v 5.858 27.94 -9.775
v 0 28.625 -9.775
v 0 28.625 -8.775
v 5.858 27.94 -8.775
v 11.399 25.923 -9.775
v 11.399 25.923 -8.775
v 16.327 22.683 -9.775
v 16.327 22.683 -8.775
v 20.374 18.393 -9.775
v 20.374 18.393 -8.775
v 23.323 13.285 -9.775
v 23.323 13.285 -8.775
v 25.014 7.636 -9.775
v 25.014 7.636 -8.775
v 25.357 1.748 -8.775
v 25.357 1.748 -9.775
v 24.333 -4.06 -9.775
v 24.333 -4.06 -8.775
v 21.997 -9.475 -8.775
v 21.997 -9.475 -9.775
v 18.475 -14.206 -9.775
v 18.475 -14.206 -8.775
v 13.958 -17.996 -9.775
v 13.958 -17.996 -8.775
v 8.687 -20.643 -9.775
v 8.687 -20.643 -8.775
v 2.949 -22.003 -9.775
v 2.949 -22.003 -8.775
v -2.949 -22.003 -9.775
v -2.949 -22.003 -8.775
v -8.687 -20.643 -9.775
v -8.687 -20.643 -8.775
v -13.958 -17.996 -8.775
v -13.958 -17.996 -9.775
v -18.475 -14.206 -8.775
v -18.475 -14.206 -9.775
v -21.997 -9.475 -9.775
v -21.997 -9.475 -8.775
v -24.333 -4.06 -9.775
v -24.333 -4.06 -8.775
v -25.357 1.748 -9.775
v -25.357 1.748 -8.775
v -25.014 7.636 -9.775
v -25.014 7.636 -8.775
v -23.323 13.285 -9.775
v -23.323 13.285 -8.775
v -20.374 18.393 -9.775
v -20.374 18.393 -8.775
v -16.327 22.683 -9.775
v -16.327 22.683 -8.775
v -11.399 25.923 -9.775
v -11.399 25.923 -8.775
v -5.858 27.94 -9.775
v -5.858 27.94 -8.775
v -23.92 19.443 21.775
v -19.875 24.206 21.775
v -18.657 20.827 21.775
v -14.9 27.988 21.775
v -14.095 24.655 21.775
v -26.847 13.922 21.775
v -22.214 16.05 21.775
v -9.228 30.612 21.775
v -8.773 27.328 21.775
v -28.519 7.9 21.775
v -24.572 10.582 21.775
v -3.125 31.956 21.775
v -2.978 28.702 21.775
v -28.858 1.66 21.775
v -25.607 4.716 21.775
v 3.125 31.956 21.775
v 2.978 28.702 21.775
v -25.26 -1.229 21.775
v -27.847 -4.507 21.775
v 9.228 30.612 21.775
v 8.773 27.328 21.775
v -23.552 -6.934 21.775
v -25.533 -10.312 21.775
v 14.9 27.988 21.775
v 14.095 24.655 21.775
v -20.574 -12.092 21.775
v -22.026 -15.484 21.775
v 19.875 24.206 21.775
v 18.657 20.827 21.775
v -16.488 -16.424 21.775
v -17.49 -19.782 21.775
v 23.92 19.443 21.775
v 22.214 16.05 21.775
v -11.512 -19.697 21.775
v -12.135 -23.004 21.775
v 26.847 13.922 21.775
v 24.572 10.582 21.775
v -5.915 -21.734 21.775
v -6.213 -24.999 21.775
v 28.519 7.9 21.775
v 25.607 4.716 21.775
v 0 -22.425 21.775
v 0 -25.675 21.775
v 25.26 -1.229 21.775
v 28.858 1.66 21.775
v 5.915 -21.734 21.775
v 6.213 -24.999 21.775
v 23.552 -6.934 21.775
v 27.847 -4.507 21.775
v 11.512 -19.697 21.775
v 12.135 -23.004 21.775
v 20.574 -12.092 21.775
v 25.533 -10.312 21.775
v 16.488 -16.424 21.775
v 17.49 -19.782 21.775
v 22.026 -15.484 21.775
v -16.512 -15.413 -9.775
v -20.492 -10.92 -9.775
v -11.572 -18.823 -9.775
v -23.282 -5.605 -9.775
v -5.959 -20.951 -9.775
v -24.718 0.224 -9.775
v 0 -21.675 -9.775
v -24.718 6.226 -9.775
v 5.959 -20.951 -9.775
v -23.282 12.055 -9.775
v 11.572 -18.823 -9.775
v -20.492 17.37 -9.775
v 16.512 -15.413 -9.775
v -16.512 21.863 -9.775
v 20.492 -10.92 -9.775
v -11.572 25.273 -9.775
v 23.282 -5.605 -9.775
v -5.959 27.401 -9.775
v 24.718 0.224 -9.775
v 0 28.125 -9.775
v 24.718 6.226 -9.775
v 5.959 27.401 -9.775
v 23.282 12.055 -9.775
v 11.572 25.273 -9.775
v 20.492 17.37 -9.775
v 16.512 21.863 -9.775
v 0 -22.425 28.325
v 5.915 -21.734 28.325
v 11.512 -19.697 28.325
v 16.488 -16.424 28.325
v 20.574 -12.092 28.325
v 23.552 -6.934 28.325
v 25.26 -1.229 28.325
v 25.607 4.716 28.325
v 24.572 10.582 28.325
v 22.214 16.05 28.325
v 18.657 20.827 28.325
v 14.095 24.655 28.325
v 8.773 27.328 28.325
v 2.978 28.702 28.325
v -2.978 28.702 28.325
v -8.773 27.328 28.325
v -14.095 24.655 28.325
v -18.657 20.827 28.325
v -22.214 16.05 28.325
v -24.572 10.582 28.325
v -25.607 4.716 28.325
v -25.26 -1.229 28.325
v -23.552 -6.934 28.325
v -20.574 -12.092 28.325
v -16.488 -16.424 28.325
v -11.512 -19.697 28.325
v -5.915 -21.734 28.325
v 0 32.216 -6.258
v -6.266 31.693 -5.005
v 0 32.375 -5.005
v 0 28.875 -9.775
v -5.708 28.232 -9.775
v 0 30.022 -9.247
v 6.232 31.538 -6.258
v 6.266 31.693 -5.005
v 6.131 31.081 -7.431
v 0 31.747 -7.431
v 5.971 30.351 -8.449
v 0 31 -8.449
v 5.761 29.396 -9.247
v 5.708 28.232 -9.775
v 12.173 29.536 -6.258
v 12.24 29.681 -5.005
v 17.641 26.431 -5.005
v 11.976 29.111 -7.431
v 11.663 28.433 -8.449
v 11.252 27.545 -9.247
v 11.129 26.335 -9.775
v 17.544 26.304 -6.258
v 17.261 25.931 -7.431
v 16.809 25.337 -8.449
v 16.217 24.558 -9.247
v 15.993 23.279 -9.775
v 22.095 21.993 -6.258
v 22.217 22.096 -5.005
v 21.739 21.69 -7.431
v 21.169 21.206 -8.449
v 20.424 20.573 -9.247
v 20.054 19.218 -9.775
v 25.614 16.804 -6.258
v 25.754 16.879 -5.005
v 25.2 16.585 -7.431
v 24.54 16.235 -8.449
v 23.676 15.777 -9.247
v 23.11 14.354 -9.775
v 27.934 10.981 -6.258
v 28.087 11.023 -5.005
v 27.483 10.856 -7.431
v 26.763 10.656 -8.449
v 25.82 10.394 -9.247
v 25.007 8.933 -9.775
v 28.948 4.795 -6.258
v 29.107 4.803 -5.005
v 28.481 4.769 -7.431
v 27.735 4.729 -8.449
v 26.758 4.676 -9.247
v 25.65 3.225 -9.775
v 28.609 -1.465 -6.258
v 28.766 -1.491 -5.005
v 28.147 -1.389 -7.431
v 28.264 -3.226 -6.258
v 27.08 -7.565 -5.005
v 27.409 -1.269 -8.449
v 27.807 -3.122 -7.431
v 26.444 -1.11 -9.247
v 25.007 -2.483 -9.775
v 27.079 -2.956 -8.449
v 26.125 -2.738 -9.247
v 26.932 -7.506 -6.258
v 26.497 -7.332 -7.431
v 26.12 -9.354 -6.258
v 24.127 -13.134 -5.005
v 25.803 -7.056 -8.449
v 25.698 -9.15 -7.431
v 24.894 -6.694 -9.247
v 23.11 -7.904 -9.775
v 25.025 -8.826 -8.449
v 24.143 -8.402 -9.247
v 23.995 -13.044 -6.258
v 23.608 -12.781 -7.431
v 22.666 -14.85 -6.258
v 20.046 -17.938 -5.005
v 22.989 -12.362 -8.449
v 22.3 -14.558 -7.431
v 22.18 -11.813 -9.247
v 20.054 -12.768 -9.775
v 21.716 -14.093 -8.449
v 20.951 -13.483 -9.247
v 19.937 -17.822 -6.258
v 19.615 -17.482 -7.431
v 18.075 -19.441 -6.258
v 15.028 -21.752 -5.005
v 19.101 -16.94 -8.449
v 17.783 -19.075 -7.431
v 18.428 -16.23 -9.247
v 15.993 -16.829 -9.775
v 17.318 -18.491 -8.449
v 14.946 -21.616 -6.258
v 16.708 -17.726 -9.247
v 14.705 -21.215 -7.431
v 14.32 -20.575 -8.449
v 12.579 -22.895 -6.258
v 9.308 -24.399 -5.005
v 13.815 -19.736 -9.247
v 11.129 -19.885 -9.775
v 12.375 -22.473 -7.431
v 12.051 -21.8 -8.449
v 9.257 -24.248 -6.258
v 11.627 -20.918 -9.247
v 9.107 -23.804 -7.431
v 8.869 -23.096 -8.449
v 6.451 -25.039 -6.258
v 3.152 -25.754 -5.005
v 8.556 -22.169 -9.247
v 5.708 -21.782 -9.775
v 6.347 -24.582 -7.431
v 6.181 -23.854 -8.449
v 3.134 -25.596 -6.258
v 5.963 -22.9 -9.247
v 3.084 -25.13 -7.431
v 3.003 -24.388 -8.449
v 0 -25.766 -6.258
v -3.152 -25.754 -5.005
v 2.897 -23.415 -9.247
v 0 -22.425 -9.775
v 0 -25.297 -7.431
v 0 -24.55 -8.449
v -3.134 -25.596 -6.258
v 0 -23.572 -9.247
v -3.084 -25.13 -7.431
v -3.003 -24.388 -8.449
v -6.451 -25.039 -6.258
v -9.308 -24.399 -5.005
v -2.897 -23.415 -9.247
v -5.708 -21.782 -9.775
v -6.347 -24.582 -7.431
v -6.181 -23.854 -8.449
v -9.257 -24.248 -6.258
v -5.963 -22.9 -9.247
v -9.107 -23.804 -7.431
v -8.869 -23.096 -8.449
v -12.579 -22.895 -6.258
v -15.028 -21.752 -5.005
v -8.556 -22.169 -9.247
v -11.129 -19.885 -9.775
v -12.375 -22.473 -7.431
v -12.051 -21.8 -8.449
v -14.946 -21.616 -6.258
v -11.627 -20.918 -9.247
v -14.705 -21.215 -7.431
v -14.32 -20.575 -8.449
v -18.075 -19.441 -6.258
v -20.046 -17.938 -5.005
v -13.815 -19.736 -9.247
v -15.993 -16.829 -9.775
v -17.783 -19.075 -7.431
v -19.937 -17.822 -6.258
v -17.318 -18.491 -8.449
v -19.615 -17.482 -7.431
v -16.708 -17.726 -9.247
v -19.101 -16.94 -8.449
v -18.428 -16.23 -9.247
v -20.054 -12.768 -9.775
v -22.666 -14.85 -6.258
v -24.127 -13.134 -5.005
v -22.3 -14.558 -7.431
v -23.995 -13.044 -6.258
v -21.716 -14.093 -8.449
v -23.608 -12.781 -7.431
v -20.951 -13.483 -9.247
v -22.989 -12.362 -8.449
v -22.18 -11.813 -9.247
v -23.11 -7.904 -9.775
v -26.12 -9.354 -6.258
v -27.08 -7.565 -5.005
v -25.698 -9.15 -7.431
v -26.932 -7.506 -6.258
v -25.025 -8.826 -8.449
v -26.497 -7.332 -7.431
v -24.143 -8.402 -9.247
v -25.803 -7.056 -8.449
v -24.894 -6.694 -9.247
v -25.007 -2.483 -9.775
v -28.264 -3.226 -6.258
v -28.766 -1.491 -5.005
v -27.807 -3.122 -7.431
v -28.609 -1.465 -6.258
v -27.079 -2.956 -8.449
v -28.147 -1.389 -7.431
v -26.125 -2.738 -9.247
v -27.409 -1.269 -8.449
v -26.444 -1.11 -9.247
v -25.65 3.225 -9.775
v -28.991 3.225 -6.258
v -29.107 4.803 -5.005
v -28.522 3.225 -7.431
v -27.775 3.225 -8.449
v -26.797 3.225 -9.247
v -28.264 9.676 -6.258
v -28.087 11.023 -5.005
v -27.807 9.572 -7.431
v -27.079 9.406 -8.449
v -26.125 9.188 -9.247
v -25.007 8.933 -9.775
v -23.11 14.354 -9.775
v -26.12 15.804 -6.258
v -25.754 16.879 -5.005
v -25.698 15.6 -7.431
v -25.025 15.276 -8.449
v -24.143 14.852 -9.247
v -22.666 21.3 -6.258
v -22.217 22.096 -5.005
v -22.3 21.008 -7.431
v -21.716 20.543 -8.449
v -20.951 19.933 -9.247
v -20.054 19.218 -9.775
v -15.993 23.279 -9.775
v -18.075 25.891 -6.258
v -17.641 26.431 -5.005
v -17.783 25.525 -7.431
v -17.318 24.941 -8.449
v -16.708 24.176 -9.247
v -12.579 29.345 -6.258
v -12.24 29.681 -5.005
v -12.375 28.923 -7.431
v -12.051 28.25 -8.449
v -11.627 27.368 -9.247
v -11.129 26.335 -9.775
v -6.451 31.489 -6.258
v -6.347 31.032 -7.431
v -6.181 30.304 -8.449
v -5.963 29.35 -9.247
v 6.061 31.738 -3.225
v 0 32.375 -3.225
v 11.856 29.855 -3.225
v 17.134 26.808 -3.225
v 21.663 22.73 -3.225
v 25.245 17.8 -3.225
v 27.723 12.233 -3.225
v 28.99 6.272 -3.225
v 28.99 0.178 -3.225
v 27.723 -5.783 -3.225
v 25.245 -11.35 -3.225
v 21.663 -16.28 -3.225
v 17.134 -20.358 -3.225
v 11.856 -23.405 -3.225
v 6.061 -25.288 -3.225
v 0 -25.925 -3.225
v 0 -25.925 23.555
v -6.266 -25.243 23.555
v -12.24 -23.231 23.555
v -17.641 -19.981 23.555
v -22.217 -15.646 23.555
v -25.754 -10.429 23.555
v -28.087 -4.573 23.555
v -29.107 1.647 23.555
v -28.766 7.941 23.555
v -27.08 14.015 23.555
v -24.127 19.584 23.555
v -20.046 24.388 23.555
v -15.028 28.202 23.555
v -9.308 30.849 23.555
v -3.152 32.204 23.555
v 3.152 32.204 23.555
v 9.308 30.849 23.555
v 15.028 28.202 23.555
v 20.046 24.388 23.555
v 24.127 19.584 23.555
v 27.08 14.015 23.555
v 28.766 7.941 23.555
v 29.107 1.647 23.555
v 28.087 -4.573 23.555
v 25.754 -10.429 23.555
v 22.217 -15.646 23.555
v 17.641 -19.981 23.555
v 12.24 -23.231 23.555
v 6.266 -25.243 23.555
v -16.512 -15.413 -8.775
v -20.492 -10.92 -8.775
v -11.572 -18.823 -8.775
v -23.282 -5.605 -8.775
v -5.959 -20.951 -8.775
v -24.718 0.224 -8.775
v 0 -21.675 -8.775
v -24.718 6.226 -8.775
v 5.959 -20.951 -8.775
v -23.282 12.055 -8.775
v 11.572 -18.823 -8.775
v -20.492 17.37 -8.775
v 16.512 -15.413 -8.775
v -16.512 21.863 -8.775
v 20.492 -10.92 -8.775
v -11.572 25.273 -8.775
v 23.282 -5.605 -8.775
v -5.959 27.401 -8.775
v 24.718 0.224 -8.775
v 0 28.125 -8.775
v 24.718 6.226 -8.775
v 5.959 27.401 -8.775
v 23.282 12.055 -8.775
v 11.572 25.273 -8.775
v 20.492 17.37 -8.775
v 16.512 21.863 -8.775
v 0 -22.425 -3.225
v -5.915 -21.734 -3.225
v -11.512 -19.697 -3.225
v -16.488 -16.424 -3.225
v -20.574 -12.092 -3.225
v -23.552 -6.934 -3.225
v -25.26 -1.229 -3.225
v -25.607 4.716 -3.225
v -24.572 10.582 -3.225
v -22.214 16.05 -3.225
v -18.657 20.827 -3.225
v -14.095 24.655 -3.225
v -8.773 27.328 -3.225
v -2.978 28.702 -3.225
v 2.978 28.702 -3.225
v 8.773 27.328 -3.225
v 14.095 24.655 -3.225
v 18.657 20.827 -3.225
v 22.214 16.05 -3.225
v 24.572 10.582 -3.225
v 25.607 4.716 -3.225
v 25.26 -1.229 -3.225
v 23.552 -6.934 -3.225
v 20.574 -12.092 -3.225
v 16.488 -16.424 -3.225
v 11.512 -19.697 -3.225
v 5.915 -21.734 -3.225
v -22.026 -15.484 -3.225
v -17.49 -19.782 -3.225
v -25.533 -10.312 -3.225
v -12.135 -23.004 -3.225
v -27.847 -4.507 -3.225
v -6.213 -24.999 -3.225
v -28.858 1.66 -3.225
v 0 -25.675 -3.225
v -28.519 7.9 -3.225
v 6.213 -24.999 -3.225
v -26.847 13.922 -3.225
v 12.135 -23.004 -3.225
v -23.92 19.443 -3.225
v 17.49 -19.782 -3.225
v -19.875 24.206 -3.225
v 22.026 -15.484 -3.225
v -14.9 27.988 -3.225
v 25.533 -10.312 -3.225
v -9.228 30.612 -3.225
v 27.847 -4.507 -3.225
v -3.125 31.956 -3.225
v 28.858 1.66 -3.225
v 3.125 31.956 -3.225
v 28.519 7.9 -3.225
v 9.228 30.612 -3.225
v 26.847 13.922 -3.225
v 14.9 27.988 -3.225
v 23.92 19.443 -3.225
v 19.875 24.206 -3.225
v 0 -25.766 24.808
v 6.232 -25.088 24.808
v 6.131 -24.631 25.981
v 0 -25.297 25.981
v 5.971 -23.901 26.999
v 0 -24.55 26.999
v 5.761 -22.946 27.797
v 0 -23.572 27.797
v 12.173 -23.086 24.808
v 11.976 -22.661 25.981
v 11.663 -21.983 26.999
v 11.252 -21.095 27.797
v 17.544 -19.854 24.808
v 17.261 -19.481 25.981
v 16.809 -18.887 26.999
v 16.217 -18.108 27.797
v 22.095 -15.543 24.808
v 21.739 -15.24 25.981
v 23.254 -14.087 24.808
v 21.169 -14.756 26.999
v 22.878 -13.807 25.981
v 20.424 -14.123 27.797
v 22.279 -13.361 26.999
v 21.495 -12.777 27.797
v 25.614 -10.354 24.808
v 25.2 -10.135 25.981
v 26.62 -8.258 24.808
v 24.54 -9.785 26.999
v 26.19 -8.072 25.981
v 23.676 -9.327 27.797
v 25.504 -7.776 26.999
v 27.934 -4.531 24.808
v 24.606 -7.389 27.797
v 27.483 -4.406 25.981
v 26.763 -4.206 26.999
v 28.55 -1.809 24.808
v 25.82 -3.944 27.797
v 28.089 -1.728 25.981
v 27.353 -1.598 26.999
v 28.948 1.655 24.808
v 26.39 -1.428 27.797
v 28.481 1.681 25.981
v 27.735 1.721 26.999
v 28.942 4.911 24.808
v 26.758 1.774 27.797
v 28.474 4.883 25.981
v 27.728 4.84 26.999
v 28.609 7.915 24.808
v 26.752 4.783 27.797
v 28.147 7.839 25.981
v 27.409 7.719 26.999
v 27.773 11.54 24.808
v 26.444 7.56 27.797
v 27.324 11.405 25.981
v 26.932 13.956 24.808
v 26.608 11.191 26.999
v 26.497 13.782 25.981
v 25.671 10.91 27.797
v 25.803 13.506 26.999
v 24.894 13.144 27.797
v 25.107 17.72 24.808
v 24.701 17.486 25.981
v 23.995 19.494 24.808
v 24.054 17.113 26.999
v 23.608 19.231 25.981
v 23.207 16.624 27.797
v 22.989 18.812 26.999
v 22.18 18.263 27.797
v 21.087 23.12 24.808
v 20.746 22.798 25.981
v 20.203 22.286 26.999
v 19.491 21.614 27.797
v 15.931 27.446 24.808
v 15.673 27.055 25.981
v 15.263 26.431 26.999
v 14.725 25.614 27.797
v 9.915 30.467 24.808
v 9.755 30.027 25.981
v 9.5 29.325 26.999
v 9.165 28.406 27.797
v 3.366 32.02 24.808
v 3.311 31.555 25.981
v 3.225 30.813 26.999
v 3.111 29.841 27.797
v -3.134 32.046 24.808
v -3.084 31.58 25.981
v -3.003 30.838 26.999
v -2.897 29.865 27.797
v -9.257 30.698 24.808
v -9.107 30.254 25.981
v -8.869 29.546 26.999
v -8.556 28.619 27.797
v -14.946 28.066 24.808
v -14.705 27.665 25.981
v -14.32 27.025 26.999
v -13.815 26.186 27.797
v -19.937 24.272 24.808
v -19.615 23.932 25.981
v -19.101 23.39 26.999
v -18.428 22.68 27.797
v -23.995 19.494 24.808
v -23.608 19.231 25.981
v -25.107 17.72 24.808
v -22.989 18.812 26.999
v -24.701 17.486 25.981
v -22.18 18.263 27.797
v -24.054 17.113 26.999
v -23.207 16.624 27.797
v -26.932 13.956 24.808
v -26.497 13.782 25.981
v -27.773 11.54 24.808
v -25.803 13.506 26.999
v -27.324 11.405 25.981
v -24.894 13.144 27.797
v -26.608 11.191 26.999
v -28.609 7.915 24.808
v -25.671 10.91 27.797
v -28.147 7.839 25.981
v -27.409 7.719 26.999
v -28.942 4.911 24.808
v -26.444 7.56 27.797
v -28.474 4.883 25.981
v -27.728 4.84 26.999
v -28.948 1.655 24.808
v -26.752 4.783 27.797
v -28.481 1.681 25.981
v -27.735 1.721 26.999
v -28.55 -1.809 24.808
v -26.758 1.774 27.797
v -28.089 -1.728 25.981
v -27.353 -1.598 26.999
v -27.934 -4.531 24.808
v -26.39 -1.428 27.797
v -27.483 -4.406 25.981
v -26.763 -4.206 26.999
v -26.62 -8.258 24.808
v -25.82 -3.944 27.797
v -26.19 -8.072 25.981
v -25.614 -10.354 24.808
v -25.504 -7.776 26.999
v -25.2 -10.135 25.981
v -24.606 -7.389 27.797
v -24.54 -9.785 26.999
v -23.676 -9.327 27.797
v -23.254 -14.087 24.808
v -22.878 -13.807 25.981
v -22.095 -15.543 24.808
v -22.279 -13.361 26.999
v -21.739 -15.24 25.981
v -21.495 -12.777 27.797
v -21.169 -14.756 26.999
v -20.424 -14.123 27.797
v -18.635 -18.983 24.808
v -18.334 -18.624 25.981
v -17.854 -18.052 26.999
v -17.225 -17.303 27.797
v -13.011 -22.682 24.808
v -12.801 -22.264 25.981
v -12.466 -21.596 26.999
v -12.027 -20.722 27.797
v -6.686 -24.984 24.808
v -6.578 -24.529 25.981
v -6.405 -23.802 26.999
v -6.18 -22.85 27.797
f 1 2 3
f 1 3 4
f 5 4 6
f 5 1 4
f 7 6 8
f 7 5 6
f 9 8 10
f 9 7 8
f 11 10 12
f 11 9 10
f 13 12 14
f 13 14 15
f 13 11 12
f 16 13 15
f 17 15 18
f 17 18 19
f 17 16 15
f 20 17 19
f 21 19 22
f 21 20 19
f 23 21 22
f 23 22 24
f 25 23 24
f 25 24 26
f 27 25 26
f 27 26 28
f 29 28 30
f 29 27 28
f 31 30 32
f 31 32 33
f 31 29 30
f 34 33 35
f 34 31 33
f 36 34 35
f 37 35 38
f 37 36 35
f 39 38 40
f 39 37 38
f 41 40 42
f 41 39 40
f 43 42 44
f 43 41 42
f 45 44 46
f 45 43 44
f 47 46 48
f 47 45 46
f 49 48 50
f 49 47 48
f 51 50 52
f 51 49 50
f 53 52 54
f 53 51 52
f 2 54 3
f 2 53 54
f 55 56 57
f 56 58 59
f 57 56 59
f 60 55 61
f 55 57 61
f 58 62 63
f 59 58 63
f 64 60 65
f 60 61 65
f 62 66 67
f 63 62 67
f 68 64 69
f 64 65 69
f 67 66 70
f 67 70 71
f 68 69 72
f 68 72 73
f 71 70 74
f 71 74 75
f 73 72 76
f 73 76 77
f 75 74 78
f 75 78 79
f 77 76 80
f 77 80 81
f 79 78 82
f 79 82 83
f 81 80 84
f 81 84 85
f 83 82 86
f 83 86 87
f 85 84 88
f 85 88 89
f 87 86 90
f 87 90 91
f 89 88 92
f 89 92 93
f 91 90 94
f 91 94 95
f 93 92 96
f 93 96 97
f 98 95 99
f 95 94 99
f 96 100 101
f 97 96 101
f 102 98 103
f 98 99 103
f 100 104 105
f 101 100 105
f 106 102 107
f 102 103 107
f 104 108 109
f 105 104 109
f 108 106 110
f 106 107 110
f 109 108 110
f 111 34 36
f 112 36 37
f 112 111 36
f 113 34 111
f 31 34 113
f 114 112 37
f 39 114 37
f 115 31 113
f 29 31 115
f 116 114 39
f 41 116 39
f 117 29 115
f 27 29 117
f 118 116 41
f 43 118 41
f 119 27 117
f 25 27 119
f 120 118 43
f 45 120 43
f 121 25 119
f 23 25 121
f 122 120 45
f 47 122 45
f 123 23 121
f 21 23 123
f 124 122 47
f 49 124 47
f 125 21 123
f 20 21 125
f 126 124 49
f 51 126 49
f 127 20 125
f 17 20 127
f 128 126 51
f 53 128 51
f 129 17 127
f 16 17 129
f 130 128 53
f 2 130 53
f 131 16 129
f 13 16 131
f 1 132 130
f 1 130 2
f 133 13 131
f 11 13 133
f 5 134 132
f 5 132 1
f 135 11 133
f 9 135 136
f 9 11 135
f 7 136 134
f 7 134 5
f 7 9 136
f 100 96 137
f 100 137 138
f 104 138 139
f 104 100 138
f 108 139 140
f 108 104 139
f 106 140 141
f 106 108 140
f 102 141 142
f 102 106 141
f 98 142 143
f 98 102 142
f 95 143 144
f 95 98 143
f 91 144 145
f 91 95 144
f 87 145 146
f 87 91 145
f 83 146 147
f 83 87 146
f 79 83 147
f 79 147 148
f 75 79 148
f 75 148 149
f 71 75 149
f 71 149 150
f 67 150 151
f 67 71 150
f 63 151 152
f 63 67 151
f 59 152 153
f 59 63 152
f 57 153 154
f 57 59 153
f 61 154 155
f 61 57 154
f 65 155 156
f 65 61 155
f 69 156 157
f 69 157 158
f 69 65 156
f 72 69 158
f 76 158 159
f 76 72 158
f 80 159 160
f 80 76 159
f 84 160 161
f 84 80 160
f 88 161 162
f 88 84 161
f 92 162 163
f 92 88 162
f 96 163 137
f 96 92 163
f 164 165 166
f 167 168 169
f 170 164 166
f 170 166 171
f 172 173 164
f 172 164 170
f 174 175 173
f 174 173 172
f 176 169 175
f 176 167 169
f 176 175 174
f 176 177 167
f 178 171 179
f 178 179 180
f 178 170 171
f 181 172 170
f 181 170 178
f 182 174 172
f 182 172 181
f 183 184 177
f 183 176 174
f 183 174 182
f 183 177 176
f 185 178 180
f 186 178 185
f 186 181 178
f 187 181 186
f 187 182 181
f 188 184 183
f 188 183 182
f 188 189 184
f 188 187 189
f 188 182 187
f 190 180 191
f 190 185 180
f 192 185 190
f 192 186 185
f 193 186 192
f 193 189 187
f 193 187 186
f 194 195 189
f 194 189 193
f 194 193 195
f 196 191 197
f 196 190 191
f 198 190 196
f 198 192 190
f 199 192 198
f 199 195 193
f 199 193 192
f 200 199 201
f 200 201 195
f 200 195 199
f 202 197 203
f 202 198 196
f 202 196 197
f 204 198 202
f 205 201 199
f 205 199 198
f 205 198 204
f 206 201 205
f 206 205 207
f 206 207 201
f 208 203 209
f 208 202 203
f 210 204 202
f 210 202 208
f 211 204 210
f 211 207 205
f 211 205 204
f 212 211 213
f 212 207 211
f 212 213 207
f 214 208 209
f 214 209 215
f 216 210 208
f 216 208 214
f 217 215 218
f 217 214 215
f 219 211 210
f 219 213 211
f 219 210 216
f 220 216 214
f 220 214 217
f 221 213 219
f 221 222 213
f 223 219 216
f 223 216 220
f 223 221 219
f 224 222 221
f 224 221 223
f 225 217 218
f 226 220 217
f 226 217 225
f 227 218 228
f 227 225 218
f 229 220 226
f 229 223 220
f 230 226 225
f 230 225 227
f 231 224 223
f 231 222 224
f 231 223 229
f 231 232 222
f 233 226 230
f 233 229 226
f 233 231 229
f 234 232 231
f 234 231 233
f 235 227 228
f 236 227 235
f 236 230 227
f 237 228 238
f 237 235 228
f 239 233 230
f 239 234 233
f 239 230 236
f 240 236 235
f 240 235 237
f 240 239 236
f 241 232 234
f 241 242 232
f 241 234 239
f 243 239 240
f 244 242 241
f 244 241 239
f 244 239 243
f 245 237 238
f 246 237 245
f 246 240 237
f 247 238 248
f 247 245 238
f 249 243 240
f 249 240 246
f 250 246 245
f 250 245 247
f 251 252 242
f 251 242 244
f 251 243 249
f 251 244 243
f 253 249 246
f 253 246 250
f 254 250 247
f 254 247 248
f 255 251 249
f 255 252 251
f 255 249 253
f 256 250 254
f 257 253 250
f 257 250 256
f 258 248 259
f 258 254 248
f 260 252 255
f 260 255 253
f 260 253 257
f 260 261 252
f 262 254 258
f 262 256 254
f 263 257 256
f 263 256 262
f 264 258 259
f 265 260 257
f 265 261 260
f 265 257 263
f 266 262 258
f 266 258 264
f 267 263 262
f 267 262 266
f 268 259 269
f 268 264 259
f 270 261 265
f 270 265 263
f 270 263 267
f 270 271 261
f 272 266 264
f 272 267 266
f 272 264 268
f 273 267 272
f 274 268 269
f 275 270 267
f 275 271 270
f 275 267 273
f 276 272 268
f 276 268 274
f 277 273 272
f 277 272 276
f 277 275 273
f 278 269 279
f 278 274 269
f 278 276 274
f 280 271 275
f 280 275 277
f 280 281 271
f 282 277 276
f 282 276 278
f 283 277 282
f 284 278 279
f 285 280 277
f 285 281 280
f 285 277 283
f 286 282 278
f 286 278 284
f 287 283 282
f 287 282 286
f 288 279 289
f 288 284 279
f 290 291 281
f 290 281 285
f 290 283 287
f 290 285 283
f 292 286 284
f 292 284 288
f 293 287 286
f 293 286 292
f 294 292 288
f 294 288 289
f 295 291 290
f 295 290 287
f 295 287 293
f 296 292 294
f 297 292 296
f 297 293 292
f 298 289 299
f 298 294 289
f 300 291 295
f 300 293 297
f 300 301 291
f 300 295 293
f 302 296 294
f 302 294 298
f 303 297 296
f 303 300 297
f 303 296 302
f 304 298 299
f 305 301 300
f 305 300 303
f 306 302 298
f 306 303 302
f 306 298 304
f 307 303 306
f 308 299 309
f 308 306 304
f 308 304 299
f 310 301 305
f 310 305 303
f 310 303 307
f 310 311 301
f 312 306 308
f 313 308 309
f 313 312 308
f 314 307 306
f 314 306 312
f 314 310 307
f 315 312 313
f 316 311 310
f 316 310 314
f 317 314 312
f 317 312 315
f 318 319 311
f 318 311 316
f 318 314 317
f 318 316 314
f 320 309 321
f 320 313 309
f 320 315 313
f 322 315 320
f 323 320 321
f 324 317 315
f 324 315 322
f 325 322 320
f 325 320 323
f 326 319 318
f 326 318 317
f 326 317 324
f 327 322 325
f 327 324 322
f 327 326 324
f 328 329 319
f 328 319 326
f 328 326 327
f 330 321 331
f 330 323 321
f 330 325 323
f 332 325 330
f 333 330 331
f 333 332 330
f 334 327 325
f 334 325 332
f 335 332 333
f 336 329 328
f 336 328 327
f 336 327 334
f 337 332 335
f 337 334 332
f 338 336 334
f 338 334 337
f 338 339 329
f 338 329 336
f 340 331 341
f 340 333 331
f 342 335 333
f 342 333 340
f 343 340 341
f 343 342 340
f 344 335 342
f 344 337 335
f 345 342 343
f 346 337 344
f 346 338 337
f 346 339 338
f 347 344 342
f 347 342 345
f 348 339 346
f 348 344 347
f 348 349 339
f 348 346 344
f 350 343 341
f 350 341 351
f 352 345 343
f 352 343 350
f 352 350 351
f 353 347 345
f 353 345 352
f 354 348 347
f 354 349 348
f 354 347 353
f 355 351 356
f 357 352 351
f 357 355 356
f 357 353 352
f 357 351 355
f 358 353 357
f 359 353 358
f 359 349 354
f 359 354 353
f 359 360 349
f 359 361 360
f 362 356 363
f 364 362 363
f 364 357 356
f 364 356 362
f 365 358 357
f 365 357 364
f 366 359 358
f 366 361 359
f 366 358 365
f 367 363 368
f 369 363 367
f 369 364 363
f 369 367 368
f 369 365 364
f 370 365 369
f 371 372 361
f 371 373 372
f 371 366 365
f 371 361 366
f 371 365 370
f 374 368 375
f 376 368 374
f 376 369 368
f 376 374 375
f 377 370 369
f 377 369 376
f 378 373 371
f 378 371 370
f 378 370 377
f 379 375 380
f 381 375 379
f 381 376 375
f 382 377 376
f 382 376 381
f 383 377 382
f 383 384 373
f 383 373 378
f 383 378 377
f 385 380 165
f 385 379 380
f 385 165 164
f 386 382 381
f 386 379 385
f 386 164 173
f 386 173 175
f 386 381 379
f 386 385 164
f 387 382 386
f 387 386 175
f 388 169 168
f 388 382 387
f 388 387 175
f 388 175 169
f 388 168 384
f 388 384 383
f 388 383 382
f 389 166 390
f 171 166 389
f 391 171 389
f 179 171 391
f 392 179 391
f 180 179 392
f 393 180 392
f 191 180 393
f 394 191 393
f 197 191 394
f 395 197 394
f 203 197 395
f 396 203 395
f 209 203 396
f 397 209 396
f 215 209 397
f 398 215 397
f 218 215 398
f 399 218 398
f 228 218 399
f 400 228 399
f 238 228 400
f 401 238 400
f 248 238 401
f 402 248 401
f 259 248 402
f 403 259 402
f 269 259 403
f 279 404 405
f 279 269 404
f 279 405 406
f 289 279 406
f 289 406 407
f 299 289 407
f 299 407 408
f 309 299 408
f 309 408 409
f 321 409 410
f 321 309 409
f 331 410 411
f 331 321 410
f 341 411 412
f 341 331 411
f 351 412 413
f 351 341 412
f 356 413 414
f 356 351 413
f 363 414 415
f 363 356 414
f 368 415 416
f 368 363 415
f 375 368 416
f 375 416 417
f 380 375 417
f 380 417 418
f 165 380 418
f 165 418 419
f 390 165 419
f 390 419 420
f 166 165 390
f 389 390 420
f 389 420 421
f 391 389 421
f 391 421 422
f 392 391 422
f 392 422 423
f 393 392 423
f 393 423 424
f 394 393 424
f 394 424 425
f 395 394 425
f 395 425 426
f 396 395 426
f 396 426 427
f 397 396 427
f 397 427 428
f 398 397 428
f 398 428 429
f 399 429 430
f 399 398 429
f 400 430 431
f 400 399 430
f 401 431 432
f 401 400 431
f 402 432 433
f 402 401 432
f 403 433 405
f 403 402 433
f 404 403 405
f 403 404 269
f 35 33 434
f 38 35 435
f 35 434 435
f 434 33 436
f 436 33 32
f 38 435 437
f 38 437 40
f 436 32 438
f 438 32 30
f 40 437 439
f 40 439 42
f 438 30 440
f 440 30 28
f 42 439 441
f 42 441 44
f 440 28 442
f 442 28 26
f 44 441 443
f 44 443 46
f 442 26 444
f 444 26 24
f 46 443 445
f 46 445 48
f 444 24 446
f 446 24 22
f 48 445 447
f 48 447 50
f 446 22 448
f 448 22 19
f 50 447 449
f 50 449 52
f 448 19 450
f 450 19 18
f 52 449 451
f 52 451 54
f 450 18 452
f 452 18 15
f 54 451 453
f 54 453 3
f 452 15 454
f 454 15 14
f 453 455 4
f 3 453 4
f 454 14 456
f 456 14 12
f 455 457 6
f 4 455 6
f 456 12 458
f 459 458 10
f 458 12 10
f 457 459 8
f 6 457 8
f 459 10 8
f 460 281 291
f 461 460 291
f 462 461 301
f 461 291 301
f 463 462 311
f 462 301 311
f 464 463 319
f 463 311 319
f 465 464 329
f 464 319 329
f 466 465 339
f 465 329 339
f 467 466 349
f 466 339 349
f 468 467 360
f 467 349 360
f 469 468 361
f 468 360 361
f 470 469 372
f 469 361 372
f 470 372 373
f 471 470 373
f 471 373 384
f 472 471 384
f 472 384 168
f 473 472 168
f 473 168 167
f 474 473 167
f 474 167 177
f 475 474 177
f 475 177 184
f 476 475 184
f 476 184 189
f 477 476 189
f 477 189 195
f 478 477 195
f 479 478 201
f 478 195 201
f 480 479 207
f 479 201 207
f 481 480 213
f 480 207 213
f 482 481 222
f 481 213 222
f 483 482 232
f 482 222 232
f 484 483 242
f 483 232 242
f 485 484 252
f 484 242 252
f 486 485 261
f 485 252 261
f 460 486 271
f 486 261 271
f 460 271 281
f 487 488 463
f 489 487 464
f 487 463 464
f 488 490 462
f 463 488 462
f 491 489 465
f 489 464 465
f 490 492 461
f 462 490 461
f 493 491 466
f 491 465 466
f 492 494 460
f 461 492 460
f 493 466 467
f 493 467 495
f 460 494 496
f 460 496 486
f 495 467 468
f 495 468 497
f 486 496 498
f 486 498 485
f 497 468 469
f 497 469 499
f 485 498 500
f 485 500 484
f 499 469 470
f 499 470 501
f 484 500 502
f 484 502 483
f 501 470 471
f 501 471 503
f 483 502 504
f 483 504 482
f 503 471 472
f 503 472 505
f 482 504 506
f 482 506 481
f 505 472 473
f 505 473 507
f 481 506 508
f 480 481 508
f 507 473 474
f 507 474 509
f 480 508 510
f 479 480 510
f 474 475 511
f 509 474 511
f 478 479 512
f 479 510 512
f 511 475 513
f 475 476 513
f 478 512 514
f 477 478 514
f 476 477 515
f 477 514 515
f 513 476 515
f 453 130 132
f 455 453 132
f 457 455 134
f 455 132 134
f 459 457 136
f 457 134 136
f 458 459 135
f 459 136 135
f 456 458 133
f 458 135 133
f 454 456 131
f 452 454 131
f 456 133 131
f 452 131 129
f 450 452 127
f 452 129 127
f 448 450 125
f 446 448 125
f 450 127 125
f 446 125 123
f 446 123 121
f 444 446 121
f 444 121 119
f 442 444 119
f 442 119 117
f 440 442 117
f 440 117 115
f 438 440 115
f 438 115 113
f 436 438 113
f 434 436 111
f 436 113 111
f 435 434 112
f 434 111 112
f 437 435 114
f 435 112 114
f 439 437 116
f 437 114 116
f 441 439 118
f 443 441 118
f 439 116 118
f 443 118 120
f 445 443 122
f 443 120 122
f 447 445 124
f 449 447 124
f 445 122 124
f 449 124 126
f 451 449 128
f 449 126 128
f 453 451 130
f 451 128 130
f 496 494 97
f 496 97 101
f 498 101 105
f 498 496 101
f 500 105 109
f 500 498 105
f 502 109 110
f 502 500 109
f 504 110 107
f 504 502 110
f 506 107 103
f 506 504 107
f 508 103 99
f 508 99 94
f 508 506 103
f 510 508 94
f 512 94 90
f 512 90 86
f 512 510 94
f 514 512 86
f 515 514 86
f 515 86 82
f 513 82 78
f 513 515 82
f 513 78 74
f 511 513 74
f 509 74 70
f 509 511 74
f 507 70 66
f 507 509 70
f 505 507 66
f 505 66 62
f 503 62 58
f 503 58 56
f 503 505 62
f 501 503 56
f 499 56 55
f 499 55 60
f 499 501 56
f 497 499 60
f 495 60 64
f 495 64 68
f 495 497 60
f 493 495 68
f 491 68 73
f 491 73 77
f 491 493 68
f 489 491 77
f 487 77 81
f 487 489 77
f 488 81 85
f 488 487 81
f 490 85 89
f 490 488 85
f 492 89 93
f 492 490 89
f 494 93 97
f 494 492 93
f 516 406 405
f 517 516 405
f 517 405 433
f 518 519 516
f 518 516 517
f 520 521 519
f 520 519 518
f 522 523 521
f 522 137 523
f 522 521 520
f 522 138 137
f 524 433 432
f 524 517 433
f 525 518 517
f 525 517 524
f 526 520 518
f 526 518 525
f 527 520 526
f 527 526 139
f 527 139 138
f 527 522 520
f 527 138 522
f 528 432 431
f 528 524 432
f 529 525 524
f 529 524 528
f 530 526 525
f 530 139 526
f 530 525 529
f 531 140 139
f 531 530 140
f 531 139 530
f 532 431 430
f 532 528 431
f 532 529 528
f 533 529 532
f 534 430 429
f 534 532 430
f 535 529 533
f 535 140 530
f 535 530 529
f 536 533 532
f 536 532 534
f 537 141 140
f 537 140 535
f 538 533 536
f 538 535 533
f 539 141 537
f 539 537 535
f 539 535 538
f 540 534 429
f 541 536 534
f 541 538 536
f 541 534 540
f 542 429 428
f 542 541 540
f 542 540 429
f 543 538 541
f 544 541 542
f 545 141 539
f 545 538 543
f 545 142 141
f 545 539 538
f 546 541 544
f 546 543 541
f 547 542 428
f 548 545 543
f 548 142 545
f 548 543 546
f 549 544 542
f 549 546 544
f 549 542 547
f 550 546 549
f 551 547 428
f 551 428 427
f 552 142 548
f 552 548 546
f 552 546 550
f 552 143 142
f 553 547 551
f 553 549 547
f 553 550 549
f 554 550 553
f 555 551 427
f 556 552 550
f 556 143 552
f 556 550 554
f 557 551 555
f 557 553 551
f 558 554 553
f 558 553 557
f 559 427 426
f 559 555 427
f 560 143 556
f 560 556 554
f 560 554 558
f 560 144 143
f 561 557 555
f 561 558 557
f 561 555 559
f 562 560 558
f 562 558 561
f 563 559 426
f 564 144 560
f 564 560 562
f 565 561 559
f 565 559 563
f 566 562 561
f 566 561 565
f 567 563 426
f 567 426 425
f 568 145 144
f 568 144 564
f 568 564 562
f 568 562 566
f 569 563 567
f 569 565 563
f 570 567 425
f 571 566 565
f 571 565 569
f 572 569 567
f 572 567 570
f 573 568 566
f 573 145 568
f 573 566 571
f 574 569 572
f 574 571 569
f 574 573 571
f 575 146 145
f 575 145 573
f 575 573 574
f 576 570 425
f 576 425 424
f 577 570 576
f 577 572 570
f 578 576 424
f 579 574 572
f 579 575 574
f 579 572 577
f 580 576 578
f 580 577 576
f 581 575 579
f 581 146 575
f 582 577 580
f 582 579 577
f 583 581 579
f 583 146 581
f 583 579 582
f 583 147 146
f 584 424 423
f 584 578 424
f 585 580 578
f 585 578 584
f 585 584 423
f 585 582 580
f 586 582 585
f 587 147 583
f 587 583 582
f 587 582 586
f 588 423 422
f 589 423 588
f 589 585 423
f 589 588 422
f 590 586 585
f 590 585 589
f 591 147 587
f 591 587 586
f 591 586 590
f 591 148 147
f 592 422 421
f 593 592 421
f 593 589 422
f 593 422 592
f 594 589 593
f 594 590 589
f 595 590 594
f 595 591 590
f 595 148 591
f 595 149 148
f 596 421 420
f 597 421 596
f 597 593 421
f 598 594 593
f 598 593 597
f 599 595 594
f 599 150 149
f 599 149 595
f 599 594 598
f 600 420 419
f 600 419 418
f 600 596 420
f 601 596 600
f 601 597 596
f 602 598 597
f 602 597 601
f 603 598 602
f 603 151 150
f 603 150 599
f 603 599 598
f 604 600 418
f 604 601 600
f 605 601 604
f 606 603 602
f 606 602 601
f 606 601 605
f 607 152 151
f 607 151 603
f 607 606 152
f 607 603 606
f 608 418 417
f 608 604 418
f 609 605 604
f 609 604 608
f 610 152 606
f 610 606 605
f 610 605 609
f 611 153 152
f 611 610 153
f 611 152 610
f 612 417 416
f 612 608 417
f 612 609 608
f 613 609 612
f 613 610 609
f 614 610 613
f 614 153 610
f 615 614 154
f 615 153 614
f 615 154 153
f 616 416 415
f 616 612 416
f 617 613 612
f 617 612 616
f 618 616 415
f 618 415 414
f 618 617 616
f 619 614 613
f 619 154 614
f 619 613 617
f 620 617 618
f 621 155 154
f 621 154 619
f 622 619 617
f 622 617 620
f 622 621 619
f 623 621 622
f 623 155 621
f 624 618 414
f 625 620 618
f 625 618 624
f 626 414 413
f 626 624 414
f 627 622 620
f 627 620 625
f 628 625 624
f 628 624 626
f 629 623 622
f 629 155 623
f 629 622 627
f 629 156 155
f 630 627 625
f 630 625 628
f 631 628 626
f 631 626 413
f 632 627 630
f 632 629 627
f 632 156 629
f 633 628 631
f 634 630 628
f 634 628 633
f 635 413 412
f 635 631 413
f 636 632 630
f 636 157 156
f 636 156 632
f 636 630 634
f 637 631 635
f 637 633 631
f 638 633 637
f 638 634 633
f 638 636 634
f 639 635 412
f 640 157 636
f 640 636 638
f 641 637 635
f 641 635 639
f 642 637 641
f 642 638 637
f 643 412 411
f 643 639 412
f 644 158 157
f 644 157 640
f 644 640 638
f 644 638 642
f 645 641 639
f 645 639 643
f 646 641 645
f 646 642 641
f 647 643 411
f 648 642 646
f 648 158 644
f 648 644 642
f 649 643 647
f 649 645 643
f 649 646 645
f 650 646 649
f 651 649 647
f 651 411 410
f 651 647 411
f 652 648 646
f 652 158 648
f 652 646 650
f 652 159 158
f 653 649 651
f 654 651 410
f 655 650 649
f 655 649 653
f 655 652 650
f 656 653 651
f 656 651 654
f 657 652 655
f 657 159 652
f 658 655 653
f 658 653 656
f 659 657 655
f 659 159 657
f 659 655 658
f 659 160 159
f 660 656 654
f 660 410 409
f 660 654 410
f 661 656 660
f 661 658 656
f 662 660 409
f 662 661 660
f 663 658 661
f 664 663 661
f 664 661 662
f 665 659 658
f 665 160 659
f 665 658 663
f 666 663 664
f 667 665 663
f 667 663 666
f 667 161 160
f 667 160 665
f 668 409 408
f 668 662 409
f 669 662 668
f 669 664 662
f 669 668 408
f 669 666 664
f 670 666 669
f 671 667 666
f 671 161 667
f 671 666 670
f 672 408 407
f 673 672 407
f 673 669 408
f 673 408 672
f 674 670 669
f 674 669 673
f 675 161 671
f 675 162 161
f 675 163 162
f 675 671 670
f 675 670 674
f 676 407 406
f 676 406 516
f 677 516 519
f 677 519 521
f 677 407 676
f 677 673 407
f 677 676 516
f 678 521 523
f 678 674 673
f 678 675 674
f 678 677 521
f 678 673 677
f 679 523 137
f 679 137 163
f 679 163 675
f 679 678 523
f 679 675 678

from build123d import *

# Parameters (mm, degrees)
SKETCH1_R             = 29.15
SKETCH1_R_2           = 28.9
BOSS_EXTRUDE1_DEPTH   = 25
SKETCH2_R             = 29.15
SKETCH2_R_2           = 25.65
BOSS_EXTRUDE2_DEPTH   = 6.55
BOSS_EXTRUDE3_START   = 6.55
SKETCH3_R             = 29.15
SKETCH3_R_2           = 25.65
BOSS_EXTRUDE3_DEPTH   = 6.55
SKETCH4_R             = 25.4
SKETCH4_R_2           = 24.9
BOSS_EXTRUDE4_DEPTH   = 1
FILLET1_R             = 5
BODY_MOVE_COPY4_ANGLE = 90


with BuildPart() as part:
    # Sketch1 → Boss-Extrude1 (new body)
    with BuildSketch(Plane(origin=(0, 0, 0), x_dir=(1, 0, 0), z_dir=(0, 1, 0))):
        with Locations(Location((0, 0, 0), (0, 0, 270))):
            Circle(SKETCH1_R)
        with Locations(Location((0, 0, 0), (0, 0, 270))):
            Circle(SKETCH1_R_2, mode=Mode.SUBTRACT)
    extrude(amount=BOSS_EXTRUDE1_DEPTH)

    # Sketch2 → Boss-Extrude2 (add)
    with BuildSketch(Plane(origin=(0, 25, 0), x_dir=(1, 0, 0), z_dir=(0, 1, 0))):
        with Locations(Location((0, 0, 0), (0, 0, 270))):
            Circle(SKETCH2_R)
        with Locations(Location((0, 0, 0), (0, 0, 270))):
            Circle(SKETCH2_R_2, mode=Mode.SUBTRACT)
    extrude(amount=BOSS_EXTRUDE2_DEPTH)

    # Sketch3 → Boss-Extrude3 (add)
    with BuildSketch(Plane.XZ.offset(BOSS_EXTRUDE3_START)):
        with Locations(Location((0, 0, 0), (0, 0, 270))):
            Circle(SKETCH3_R)
        with Locations(Location((0, 0, 0), (0, 0, 90))):
            Circle(SKETCH3_R_2, mode=Mode.SUBTRACT)
    extrude(amount=-BOSS_EXTRUDE3_DEPTH)

    # Fillet1
    # the kernel refuses this fillet: 5 mm, written as the material it takes off along each edge
    with BuildSketch(Plane(origin=(0, -6.55, 0), x_dir=(0, 0, -1), z_dir=(-1, 0, 0))) as fillet1_piece_1:
        with BuildLine():
            CenterArc((24.15, -4.769696007), FILLET1_R, 0, 72.542396876)
            Line((25.65, 0), (25.68, 0.09539392))
            ThreePointArc((25.68, 0.09539392), (27.4, 0.1), (29.15, 0.1))
            Line((29.15, 0.1), (29.25, 0))
            Line((29.25, 0), (29.25, -4.769696007))
            Line((29.25, -4.769696007), (29.15, -4.769696007))
        make_face()
    revolve(axis=Axis((0, -6.55, 0), (0, -1, 0)), mode=Mode.SUBTRACT)
    with BuildSketch(Plane(origin=(0, 31.55, 0), x_dir=(0, 0, 1), z_dir=(-1, 0, 0))) as fillet1_piece_2:
        with BuildLine():
            CenterArc((24.15, -4.769696007), FILLET1_R, 360, 72.542396876)
            Line((25.65, 0), (25.68, 0.09539392))
            ThreePointArc((25.68, 0.09539392), (27.4, 0.1), (29.15, 0.1))
            Line((29.15, 0.1), (29.25, 0))
            Line((29.25, 0), (29.25, -4.769696007))
            Line((29.25, -4.769696007), (29.15, -4.769696007))
        make_face()
    revolve(axis=Axis((0, 31.55, 0), (0, 1, 0)), mode=Mode.SUBTRACT)


with BuildPart() as body_2:
    # Sketch4 → Boss-Extrude4 (new body)
    with BuildSketch(Plane.XZ.offset(6.55)):
        with Locations(Location((0, 0, 0), (0, 0, 270))):
            Circle(SKETCH4_R)
        with Locations(Location((0, 0, 0), (0, 0, 270))):
            Circle(SKETCH4_R_2, mode=Mode.SUBTRACT)
    extrude(amount=-BOSS_EXTRUDE4_DEPTH)


with BuildPart() as part_1:
    # Body-Move/Copy4: moved
    add(part.part.rotate(Axis((0, 3.225, 0), (1, 0, 0)), BODY_MOVE_COPY4_ANGLE))


with BuildPart() as body_2_1:
    # Body-Move/Copy4: moved
    add(body_2.part.rotate(Axis((0, 3.225, 0), (1, 0, 0)), BODY_MOVE_COPY4_ANGLE))


solid = Compound([part_1.part, body_2_1.part])
